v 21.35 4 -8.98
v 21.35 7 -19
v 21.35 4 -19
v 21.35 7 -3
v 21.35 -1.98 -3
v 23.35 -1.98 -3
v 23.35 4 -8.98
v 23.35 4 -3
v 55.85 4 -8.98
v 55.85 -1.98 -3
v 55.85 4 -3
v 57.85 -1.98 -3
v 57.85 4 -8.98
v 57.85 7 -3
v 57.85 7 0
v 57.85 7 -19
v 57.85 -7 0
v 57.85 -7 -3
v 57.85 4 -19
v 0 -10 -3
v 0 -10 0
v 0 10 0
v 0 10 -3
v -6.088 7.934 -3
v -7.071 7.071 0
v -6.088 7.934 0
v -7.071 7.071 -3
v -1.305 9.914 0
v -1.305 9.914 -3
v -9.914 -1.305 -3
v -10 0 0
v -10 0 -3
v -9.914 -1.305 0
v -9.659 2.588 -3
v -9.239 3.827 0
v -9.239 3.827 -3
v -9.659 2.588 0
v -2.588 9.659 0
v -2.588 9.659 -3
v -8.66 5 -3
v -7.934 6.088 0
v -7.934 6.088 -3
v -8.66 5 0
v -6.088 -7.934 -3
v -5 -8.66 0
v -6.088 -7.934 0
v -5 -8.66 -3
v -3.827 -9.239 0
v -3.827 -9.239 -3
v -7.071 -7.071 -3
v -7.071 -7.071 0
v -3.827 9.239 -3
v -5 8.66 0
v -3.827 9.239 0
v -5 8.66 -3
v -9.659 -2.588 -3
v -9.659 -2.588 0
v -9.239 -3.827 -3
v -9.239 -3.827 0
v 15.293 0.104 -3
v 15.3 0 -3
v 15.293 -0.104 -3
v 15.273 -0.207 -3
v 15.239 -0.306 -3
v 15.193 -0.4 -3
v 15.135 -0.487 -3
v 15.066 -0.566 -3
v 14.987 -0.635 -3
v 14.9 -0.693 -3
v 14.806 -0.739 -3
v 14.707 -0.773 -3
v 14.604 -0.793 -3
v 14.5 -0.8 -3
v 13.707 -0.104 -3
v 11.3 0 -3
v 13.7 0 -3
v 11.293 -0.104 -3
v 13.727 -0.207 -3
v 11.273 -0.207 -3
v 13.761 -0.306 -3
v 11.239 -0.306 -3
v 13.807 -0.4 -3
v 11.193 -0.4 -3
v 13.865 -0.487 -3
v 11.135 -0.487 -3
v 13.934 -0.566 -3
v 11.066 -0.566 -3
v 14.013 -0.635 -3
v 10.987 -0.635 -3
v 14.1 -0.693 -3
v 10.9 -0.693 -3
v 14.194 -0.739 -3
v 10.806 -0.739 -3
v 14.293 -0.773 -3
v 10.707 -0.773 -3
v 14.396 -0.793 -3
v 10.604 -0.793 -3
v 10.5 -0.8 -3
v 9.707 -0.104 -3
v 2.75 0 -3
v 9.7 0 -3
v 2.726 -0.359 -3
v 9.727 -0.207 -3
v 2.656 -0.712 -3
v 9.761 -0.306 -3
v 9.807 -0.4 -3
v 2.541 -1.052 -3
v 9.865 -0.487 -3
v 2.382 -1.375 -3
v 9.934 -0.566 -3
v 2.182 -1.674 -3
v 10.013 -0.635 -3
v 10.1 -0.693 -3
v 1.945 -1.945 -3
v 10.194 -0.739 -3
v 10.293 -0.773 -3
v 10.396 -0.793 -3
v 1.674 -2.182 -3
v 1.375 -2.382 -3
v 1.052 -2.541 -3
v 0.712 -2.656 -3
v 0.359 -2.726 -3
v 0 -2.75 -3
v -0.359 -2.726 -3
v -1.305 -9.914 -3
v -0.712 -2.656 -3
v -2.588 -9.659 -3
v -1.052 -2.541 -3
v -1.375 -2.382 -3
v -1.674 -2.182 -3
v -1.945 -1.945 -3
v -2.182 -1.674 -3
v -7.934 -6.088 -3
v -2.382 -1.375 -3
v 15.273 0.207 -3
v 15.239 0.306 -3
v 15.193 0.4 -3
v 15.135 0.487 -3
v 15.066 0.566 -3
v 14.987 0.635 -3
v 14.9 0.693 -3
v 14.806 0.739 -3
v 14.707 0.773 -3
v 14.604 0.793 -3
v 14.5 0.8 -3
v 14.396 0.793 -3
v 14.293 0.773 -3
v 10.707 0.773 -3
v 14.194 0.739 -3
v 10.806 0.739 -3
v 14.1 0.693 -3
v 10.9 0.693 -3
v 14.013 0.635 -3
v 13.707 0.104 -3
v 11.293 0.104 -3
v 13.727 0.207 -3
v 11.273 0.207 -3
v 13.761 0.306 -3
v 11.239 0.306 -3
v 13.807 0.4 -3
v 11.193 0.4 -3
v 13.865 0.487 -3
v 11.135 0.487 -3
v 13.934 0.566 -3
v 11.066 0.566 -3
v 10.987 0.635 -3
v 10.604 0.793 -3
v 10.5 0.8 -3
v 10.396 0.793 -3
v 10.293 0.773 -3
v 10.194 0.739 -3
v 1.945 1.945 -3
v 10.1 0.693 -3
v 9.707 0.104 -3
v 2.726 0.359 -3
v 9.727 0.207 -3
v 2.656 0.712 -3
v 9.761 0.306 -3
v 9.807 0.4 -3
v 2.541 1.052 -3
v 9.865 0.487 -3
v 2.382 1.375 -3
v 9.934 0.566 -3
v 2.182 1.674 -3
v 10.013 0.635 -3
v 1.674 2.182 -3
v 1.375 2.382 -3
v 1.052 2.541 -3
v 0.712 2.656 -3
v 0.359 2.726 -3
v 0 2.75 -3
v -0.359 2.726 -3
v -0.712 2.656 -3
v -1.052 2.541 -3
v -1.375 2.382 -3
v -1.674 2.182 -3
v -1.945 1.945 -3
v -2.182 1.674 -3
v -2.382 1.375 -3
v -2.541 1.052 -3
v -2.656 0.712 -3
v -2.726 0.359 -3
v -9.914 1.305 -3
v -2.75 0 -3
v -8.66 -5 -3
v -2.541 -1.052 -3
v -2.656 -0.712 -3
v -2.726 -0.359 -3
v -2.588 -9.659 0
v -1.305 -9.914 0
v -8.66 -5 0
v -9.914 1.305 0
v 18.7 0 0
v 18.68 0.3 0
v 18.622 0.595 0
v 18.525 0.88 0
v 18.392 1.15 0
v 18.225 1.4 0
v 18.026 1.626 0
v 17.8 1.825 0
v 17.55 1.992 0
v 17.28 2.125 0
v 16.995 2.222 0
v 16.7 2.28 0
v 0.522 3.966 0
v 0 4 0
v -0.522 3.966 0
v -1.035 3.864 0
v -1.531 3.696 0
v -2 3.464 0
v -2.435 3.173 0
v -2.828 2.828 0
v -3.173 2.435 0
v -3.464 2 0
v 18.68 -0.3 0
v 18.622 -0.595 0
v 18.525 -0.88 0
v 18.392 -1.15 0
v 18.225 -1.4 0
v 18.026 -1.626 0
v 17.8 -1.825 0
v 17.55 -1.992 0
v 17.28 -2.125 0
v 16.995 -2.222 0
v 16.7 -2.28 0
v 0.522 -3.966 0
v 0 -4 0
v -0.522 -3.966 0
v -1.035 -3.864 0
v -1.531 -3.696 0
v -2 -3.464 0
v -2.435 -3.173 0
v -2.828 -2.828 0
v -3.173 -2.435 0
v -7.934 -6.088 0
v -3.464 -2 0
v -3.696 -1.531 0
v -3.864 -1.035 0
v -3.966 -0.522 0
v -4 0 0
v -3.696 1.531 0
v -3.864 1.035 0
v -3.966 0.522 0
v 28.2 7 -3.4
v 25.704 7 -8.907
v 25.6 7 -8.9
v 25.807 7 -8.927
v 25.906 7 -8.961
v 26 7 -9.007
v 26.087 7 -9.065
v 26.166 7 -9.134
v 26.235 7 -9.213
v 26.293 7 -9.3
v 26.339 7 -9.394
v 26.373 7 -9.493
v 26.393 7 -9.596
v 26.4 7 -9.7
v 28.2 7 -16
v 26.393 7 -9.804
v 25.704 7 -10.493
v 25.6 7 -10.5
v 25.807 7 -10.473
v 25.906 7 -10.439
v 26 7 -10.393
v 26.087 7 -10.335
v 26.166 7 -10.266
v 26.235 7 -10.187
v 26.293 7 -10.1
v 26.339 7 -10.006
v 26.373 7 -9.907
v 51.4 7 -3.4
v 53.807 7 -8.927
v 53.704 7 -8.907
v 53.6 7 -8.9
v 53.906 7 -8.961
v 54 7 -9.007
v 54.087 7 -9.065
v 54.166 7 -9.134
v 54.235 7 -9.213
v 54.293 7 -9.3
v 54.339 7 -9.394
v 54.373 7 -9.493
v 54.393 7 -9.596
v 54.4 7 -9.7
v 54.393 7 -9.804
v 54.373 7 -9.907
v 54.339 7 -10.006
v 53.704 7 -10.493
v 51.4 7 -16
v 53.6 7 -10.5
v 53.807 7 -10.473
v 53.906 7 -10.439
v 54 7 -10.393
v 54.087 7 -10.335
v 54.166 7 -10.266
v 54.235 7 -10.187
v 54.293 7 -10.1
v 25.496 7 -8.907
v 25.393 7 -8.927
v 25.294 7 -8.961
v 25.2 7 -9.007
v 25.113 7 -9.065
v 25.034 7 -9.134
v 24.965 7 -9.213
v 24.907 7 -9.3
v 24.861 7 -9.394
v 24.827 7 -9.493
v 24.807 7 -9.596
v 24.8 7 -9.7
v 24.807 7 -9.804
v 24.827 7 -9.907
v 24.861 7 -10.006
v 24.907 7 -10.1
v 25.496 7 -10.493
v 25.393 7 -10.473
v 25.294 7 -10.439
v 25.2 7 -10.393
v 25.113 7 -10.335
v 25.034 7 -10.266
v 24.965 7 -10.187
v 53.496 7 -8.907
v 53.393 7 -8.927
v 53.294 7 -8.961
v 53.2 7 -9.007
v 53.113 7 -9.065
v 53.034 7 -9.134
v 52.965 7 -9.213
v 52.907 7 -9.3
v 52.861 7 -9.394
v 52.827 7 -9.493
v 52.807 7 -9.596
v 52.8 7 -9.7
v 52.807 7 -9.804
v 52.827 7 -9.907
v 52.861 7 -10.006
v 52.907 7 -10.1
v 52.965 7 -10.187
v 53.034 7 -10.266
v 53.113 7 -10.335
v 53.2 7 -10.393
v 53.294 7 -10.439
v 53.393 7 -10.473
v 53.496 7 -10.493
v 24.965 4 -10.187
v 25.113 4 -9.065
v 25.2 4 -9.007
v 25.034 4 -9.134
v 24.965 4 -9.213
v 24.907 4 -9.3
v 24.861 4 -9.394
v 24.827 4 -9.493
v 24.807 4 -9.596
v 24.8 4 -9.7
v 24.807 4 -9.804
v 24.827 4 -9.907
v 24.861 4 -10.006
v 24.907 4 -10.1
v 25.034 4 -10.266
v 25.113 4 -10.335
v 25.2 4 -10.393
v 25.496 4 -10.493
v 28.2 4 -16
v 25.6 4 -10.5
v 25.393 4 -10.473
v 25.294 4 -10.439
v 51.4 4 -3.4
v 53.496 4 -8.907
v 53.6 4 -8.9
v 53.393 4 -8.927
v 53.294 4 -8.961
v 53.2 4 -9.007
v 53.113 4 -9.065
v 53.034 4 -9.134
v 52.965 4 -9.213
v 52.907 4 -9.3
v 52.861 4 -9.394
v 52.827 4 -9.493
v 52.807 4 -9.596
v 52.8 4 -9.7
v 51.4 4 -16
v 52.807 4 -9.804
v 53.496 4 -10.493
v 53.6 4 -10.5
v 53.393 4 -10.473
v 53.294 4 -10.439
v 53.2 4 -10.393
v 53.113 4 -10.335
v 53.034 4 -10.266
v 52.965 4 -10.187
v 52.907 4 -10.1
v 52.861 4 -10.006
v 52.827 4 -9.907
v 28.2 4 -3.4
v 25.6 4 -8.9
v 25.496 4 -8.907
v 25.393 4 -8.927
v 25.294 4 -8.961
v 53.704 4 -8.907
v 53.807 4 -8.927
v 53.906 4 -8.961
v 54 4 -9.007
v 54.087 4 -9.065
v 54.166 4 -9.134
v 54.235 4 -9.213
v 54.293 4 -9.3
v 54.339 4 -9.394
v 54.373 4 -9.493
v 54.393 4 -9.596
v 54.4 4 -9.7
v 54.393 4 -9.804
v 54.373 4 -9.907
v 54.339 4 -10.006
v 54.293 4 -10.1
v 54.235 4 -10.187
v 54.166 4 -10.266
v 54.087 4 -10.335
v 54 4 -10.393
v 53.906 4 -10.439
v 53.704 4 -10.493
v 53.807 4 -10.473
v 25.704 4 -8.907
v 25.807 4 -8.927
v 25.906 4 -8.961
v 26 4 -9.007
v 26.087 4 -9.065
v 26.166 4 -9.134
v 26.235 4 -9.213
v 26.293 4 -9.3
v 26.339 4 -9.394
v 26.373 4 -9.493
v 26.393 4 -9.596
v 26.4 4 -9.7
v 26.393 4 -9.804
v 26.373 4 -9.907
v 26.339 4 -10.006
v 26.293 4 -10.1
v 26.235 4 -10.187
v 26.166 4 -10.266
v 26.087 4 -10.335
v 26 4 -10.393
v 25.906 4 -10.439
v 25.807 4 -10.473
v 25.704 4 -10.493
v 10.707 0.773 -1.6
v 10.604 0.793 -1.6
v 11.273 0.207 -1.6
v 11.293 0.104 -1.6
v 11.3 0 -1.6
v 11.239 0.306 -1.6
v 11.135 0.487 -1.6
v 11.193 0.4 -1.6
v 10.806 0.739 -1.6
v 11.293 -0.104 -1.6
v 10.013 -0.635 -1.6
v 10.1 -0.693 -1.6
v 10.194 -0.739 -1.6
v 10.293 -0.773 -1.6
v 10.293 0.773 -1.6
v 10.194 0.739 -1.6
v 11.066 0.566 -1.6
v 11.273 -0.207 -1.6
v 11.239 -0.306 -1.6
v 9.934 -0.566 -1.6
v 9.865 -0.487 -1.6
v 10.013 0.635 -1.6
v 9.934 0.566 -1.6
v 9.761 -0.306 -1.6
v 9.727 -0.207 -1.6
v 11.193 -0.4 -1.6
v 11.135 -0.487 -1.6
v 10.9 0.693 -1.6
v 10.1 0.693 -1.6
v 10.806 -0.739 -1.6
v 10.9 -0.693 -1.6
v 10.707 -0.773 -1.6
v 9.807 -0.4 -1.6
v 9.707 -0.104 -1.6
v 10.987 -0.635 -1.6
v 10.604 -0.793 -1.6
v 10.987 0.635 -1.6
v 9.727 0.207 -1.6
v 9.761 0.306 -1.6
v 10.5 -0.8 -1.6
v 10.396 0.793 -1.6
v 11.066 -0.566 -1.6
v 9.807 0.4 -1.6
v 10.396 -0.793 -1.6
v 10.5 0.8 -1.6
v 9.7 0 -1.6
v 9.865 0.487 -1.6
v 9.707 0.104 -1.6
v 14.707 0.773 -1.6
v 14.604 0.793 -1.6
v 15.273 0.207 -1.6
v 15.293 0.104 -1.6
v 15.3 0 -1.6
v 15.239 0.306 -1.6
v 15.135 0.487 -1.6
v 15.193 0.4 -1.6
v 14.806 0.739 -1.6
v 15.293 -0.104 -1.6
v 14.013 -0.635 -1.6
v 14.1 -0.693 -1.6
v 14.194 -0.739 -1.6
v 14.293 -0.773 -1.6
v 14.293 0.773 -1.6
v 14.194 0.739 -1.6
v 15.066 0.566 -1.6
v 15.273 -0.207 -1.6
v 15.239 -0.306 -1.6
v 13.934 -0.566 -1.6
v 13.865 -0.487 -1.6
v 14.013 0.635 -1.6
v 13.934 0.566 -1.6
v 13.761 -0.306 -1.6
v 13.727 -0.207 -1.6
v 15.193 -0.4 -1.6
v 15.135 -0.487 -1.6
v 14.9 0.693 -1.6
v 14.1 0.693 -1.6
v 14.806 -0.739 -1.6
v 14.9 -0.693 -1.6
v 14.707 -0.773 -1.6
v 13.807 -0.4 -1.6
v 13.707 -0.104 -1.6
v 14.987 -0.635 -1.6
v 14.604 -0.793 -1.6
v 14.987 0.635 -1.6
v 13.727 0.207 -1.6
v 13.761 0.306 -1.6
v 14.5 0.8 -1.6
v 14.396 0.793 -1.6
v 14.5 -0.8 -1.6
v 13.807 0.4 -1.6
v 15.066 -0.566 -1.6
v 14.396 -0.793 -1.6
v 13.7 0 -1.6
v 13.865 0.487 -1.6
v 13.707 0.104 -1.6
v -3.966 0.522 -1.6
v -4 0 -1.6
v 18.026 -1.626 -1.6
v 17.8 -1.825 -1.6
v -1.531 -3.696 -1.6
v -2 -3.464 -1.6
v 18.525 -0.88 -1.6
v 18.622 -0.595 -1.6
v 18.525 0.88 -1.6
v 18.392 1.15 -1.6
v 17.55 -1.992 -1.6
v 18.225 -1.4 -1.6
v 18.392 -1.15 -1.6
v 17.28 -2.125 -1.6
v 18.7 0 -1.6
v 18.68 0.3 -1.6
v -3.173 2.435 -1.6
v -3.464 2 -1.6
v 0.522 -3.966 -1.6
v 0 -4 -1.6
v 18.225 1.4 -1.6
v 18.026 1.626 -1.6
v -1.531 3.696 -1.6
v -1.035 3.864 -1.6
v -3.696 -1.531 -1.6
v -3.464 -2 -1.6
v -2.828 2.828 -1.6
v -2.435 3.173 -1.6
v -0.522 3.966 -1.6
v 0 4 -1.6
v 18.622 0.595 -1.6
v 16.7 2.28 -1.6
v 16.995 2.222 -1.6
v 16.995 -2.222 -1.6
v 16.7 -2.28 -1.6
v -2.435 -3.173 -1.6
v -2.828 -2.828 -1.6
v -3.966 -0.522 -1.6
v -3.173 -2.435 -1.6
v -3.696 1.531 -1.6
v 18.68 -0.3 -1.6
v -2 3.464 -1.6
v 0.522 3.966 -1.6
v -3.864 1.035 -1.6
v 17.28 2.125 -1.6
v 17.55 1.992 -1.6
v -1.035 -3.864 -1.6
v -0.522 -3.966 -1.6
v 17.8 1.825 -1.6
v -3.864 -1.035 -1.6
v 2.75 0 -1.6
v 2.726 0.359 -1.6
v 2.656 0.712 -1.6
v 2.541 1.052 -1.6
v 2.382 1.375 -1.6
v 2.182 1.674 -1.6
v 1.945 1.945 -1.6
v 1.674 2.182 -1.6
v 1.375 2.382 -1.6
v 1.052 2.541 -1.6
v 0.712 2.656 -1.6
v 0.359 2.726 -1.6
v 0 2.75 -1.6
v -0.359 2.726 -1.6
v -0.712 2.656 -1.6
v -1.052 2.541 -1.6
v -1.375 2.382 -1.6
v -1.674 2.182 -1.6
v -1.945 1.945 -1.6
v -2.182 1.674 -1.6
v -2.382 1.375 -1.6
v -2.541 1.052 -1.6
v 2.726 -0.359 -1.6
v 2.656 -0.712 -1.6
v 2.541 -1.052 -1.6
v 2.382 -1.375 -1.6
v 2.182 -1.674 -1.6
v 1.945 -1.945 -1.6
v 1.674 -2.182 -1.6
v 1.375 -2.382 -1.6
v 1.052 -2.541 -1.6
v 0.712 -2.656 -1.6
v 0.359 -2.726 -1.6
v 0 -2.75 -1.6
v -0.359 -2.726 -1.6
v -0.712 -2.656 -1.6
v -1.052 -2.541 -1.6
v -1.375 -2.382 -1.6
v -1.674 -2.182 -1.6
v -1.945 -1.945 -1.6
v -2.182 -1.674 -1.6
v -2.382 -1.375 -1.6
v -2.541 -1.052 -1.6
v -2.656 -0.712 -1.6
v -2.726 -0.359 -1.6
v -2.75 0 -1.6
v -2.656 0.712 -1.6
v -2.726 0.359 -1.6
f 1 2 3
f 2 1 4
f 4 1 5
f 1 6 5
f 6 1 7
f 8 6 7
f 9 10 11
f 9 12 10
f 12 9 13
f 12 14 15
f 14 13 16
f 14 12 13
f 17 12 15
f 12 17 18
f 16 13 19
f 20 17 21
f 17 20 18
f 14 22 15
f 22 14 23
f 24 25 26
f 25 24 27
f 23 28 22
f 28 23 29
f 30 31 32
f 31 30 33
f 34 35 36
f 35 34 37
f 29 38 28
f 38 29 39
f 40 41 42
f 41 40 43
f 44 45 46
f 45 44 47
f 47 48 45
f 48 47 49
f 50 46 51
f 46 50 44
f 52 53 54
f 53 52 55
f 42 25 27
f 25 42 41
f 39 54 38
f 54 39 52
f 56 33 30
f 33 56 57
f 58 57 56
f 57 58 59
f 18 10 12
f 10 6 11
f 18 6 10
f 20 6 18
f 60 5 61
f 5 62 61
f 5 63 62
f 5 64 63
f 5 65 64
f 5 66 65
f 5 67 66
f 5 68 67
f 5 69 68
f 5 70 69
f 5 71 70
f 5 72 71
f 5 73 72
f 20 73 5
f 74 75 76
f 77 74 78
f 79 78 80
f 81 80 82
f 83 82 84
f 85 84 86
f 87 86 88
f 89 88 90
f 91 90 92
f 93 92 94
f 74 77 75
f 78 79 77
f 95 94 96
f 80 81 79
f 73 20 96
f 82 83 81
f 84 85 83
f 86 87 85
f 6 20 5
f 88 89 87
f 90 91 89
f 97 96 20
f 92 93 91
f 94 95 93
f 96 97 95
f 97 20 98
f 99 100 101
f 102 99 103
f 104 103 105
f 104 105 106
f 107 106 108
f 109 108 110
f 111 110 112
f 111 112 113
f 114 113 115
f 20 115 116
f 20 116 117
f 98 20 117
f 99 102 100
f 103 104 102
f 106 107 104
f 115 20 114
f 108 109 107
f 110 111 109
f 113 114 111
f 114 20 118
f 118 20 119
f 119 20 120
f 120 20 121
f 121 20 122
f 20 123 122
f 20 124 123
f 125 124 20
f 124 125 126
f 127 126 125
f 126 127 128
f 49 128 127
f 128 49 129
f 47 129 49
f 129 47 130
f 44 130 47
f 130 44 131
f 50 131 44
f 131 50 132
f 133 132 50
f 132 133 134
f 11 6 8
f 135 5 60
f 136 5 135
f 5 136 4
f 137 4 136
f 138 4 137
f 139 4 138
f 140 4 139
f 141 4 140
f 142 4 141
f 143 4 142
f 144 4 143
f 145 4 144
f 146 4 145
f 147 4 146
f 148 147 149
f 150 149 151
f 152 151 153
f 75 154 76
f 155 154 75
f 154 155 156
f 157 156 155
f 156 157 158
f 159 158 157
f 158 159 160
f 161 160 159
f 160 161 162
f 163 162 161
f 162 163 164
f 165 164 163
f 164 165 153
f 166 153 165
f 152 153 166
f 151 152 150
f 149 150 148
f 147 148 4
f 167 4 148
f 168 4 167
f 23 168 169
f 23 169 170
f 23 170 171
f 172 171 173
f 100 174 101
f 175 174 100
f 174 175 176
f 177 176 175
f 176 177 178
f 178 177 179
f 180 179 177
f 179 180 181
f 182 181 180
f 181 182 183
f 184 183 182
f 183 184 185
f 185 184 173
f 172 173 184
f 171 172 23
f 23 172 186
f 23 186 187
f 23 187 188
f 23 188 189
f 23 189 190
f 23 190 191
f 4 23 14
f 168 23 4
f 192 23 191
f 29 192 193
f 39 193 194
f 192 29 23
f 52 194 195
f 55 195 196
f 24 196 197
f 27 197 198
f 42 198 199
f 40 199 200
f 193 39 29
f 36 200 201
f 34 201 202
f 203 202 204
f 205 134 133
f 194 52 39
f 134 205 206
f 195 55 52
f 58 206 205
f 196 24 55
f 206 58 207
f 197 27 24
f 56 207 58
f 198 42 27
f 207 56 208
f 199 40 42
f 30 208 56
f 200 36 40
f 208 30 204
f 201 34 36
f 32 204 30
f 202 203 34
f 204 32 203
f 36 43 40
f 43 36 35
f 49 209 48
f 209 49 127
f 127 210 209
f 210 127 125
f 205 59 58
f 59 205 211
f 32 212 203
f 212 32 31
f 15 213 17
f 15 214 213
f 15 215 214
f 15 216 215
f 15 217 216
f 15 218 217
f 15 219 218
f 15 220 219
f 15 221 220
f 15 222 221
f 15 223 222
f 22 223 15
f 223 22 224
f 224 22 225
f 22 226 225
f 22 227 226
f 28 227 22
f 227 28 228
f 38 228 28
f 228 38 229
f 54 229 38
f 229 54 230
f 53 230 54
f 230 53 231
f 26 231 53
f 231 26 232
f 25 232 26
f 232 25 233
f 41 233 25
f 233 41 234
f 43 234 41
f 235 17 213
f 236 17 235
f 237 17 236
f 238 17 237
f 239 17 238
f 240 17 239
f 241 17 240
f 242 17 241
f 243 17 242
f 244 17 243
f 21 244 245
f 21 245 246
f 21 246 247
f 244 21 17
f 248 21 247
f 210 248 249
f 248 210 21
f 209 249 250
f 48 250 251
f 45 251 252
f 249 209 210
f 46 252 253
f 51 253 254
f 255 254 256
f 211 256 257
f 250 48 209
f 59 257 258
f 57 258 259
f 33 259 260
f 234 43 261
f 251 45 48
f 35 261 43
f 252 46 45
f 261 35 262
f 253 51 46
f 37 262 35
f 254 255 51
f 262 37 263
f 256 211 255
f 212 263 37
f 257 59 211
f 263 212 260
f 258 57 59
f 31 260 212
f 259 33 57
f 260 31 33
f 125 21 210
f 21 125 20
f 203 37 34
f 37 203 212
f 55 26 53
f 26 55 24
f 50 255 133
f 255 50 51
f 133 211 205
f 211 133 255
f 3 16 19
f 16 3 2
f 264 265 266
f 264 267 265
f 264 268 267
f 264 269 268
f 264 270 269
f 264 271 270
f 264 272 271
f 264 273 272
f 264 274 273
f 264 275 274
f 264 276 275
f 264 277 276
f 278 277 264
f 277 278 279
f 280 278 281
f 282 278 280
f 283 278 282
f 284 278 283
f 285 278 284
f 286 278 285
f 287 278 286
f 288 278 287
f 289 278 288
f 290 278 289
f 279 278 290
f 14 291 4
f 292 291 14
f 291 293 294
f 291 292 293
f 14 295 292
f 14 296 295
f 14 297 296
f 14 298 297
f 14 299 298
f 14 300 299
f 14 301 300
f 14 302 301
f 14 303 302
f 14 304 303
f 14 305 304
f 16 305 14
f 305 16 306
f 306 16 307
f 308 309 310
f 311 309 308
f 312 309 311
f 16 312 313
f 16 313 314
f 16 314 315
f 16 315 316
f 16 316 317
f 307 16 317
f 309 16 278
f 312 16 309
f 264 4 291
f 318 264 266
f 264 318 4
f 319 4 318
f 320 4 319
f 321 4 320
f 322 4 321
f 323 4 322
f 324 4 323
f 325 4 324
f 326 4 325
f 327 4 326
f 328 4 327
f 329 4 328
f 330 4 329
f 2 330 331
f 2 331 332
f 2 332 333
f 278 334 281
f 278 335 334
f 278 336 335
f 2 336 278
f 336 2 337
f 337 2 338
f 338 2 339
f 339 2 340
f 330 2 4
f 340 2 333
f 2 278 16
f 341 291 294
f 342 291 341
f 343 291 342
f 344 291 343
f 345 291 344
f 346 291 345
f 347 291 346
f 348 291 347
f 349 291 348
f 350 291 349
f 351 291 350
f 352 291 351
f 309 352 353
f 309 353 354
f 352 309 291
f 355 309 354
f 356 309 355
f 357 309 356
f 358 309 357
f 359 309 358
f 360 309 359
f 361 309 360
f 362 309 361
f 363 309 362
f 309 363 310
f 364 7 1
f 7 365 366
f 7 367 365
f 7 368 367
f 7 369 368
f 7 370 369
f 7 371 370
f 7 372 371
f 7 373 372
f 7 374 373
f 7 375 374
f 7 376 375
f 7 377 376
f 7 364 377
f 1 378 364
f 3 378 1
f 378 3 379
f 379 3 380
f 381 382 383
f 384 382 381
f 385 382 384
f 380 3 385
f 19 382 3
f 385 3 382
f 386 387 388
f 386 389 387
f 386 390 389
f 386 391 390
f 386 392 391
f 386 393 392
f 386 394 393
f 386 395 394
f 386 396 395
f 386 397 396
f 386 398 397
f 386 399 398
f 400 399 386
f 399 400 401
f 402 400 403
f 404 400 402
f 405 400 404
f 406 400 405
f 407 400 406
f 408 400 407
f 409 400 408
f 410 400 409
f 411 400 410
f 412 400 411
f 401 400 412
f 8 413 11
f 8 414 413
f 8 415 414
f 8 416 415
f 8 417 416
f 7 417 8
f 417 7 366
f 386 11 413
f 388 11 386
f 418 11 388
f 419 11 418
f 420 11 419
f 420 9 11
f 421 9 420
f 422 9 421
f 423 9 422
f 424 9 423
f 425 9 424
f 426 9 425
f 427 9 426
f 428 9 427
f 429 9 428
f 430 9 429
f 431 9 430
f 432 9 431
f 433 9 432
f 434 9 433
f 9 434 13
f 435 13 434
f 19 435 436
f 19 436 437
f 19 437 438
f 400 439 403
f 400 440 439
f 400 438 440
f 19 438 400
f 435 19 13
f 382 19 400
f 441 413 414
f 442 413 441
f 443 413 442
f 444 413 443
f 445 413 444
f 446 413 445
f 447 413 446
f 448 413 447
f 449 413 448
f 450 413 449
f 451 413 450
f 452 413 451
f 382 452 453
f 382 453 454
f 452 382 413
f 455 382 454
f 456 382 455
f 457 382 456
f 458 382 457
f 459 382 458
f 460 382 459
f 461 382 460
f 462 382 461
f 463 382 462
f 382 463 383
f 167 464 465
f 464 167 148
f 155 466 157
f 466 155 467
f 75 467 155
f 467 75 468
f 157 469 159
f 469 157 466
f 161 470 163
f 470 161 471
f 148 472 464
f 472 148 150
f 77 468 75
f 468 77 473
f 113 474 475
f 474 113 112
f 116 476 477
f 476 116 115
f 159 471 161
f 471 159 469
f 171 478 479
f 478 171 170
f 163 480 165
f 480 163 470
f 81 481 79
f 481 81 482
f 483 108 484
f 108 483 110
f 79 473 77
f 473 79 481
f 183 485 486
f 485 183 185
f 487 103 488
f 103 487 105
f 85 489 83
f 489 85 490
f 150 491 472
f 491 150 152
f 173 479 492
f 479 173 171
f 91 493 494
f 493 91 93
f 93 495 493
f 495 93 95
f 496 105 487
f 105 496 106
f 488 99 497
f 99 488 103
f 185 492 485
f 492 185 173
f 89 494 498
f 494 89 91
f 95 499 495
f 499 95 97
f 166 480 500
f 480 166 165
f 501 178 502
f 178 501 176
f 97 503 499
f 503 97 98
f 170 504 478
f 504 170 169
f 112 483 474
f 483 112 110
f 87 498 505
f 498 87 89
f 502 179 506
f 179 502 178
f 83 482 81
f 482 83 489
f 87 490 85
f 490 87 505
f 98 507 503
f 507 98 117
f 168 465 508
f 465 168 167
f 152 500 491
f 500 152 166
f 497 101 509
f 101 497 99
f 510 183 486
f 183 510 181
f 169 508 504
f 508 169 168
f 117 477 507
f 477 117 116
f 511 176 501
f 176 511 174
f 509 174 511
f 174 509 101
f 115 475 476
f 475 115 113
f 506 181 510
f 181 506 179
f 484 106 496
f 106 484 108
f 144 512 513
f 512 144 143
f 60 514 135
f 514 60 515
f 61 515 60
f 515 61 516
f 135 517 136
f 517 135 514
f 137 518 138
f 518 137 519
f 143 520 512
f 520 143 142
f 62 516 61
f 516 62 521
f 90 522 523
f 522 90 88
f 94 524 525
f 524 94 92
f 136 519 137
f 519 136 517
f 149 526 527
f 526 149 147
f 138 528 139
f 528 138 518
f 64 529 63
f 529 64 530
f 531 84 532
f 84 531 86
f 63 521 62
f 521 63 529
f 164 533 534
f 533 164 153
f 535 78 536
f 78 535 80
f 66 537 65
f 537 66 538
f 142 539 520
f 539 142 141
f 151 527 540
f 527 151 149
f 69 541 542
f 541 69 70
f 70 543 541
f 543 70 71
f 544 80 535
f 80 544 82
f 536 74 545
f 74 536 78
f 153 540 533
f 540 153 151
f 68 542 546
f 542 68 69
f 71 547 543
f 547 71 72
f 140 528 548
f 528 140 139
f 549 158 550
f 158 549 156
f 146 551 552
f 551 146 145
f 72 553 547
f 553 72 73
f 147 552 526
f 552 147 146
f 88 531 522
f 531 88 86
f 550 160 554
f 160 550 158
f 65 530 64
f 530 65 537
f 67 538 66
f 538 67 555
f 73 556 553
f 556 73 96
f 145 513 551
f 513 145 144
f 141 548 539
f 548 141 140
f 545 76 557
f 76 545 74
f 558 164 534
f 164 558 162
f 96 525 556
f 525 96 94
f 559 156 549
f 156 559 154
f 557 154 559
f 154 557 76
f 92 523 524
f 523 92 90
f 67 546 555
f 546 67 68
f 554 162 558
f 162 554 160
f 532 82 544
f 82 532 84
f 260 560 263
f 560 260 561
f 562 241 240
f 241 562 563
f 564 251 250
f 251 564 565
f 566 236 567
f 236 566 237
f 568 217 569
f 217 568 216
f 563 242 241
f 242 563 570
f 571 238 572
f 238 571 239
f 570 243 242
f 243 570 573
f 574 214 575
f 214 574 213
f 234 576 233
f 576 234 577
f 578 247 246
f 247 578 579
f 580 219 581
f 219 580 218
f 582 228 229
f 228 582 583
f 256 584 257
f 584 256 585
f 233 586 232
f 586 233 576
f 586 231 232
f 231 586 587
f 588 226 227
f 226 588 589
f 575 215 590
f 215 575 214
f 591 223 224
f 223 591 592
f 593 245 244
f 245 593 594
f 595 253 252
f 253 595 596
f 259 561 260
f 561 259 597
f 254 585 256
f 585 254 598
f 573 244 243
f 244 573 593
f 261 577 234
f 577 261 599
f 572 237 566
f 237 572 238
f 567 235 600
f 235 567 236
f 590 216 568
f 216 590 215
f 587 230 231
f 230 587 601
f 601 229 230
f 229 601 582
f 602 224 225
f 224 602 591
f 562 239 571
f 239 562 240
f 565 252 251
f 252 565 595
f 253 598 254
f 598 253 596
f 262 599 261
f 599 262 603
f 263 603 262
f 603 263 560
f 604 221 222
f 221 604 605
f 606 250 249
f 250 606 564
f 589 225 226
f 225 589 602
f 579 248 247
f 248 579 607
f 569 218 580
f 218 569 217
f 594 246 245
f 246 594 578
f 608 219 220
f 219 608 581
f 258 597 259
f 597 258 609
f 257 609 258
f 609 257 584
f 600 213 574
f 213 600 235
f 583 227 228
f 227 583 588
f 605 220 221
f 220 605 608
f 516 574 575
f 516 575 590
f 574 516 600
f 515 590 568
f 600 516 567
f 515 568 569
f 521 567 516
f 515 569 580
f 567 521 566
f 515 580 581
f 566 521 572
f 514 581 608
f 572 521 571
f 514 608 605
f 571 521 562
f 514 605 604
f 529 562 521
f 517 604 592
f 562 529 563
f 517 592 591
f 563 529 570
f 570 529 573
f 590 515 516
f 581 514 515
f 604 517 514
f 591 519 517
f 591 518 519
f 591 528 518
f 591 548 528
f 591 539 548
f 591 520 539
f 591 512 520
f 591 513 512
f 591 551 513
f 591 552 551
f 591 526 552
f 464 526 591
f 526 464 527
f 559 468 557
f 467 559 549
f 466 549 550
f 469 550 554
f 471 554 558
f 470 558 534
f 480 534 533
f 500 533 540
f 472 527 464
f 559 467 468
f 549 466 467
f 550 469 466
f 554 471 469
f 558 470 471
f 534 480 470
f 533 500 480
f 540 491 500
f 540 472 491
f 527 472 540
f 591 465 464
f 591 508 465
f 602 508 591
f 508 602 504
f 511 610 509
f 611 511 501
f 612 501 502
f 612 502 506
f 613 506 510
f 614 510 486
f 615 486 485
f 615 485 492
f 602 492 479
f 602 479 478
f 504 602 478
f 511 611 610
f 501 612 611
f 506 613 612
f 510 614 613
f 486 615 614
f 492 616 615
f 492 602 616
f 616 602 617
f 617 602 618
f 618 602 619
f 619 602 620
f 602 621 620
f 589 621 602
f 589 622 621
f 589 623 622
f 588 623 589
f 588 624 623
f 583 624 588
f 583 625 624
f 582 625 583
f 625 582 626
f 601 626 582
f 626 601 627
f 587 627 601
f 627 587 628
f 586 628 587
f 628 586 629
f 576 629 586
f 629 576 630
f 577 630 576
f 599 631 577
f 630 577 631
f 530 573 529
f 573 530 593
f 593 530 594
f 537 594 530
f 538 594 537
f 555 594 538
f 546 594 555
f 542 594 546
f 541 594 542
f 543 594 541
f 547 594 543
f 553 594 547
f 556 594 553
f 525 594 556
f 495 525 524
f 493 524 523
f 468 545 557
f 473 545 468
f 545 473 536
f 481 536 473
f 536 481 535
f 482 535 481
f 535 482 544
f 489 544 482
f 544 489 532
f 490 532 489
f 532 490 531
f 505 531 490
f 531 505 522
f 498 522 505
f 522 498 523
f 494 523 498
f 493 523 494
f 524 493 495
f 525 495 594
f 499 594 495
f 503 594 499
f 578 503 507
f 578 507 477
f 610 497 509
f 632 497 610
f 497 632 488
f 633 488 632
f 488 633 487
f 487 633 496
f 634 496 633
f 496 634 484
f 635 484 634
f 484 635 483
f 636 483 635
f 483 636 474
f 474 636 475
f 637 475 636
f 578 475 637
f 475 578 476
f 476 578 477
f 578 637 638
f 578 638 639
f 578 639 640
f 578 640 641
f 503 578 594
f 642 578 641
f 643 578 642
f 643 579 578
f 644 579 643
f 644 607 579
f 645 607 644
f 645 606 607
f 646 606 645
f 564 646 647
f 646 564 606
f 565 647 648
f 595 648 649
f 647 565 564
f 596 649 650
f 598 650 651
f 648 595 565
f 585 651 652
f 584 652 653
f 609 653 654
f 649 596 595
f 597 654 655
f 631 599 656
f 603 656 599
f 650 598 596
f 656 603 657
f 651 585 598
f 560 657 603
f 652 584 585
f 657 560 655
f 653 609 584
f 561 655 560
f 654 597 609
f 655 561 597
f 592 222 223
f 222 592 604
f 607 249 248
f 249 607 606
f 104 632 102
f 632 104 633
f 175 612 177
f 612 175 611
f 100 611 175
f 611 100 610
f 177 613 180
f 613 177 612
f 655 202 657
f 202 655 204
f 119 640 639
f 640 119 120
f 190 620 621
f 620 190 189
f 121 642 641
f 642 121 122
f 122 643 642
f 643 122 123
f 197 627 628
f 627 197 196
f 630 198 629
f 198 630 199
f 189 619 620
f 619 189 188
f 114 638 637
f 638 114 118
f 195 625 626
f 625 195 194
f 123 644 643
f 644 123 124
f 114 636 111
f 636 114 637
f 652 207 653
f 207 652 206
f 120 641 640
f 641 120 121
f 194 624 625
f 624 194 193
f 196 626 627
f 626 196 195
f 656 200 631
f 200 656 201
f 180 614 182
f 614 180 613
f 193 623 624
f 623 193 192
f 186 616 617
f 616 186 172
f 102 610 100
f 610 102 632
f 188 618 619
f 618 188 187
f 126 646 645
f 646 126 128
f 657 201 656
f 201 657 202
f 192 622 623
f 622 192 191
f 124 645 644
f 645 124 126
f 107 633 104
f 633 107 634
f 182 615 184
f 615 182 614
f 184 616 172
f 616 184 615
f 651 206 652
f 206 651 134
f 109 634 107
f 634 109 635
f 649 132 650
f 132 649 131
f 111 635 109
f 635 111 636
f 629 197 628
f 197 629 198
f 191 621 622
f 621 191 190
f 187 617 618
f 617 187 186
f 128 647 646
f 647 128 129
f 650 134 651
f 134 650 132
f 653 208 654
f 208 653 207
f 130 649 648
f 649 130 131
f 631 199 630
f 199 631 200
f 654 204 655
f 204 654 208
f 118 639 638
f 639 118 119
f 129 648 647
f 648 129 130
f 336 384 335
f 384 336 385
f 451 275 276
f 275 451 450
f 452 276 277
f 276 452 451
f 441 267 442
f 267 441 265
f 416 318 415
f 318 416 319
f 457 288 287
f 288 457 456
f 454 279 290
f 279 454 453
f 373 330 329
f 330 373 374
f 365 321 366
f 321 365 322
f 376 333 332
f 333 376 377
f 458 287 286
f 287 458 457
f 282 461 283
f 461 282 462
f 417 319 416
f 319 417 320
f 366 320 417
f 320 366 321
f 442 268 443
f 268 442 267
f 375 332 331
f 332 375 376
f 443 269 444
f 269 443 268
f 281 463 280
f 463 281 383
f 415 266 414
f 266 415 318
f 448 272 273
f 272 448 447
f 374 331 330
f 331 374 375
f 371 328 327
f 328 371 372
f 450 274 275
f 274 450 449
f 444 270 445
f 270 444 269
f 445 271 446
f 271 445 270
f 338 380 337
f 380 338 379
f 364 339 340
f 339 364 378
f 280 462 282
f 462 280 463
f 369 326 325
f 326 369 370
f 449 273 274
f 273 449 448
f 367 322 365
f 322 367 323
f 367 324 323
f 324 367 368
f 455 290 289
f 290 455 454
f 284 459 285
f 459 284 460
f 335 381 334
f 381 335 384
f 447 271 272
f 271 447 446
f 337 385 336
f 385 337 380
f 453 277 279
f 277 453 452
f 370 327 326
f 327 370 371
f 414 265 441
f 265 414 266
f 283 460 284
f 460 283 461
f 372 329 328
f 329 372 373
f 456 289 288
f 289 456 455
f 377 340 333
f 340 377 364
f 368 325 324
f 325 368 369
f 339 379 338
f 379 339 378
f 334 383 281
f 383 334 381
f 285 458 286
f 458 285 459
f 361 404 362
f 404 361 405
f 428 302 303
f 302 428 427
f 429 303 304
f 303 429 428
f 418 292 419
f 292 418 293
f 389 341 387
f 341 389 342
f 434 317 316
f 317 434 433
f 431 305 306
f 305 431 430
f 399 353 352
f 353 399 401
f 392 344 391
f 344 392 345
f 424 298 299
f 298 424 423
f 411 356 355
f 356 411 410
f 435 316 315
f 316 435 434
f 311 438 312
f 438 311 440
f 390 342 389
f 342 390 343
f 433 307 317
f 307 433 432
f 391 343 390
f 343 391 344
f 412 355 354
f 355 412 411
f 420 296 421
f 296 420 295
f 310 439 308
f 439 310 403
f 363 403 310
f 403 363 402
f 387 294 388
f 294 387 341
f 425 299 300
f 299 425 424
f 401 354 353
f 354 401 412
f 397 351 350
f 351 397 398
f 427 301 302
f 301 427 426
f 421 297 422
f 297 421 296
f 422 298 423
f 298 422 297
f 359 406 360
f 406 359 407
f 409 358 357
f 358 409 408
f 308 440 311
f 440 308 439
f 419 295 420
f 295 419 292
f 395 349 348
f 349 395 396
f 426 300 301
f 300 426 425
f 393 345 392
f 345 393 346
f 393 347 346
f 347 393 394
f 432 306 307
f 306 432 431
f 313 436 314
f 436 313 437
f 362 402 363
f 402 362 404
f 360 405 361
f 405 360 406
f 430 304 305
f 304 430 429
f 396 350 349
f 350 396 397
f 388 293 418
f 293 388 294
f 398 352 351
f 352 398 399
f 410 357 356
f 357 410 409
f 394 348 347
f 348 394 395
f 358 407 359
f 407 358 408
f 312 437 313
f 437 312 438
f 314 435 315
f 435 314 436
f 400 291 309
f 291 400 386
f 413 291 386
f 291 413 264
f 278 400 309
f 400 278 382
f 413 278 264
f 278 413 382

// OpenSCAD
// file: params.scad
// 六足机器人 · 共享参数（被 body_plate / deck / femur / tibia 引用，本文件自己不导出 STL）
//
// 腿的几何尺寸和 Seeker 固件 mcu_ws/lib/RobotConfig/HexapodConfig.h 一一对应：
//   body_half_length ↔ kBodyHalfLength    body_half_width ↔ kBodyHalfWidth
//   L1 ↔ kL1（髋轴 → 膝轴）              L2 ↔ kL2（膝轴 → 脚尖）
// 改了这里的数字，固件里的同名常数也要一起改。
//
// ★ 先用游标卡尺量你的舵机和舵机臂，改 [舵机] 和 [舵机臂] 两组数字，再导出 STL。

/* [舵机 MG90S（量你自己的）] */
servo_w = 12.2;           // 机身宽度 (mm)
servo_l = 22.8;           // 机身长度，沿安装耳方向 (mm)
ear_span = 32.5;          // 两个安装耳外端之间的总长 (mm)
ear_hole_spacing = 28.0;  // 两个安装孔的中心距 (mm)
ear_z = 15.9;             // 机身底面 → 安装耳下表面 (mm)
case_h = 22.7;            // 机身底面 → 机壳顶面（不含输出轴）(mm)
shaft_off = 5.4;          // 输出轴中心 → 机身中心，沿长度方向 (mm)
shaft_gap = 4.0;          // 机壳顶面 → 舵机臂贴合面（花键凸台高度）(mm)

/* [舵机臂（单边臂，量你自己的）] */
horn_hub_d = 7.6;         // 舵机臂中心圆盘直径 (mm)
horn_len = 18.5;          // 中心 → 臂尖 (mm)
horn_w_hub = 6.2;         // 臂根宽度 (mm)
horn_w_tip = 4.2;         // 臂尖宽度 (mm)
horn_t = 1.6;             // 臂厚 = 零件上凹槽深度 (mm)
horn_holes = [10.5, 14.5];// 用来固定舵机臂的两个孔到中心的距离 (mm)
horn_screw_access = 5.5;  // 中心过孔：舵机臂中心螺丝和螺丝刀从这里进 (mm)

/* [腿的几何（和固件一致）] */
body_half_length = 60;    // 前 / 后腿髋轴到机身中心的 X 距离 (mm)
body_half_width = 40;     // 左 / 右腿髋轴到机身中心的 Y 距离 (mm)
L1 = 45;                  // 大腿：髋轴 → 膝轴 (mm)
L2 = 65;                  // 小腿：膝轴 → 脚尖 (mm)

/* [打印余量] */
clearance = 0.4;          // 方孔比舵机大多少 (mm)；太紧就加大到 0.5
screw_pilot = 1.6;        // M2 自攻螺丝底孔 (mm)
m3_hole = 3.4;            // M3 通孔 (mm)

/* [Hidden] */
// 6 条腿：[髋轴 X, 髋轴 Y, 朝外方向角°]，顺序 FL FR ML MR RL RR（和固件的 leg 0..5 一致）
legs = [
  [ body_half_length,  body_half_width,   60],
  [ body_half_length, -body_half_width,  -60],
  [ 0,                 body_half_width,   90],
  [ 0,                -body_half_width,  -90],
  [-body_half_length,  body_half_width,  120],
  [-body_half_length, -body_half_width, -120]
];
leg_names = ["FL", "FR", "ML", "MR", "RL", "RR"];

pocket_w = servo_w + clearance;
pocket_l = servo_l + clearance;
servo_end_out = servo_l / 2 - shaft_off;   // 输出轴 → 机身外端 (mm)
servo_end_in = servo_l / 2 + shaft_off;    // 输出轴 → 机身内端 (mm)

// 单边舵机臂的 2D 外形：中心在原点，臂沿 +X
module horn_2d(extra = 0) {
  hull() {
    circle(d = horn_hub_d + extra);
    translate([0, -(horn_w_hub + extra) / 2]) square([0.01, horn_w_hub + extra]);
    translate([horn_len - horn_w_tip / 2, 0]) circle(d = horn_w_tip + extra);
  }
}

// 舵机臂凹槽（从 z = 0 往 +Z 挖 horn_t 深）+ 中心过孔 + 两个固定孔
module horn_cut(depth_through = 10) {
  translate([0, 0, -0.01]) linear_extrude(horn_t + 0.01) horn_2d(clearance);
  translate([0, 0, -1]) cylinder(d = horn_screw_access, h = depth_through + 2);
  for (r = horn_holes) translate([r, 0, -1]) cylinder(d = screw_pilot, h = depth_through + 2);
}
// main file
// 六足机器人 · 大腿 (femur)
//
// 一头（原点）压在髋舵机的舵机臂上，另一头是一块竖着的侧板，膝舵机横着插在侧板的方孔里，
// 输出轴朝外，小腿 (tibia.scad) 装在膝舵机的舵机臂上。髋轴 → 膝轴的距离 = L1。
//
//   side = "a"：左边三条腿（FL / ML / RL）用，3 个
//   side = "b"：右边三条腿（FR / MR / RR）用，3 个（a 的镜像）
//
// 打印：PETG 或 PLA+，层高 0.2 mm，4 圈壁，30% 填充。
//       顶面（有舵机臂凹槽的一面）朝下贴热床，侧板朝上，不需要支撑。
// 坐标：原点 = 髋轴，X+ = 沿大腿朝外，Z+ = 朝上（装到机器人上时的方向）。

include <params.scad>

side = "a";               // "a" 或 "b"

/* [大腿] */
arm_t = 3.0;              // 上面横板厚度 (mm)
arm_w = 14;               // 横板宽度 (mm)
hub_r = 10;               // 髋端圆盘半径 (mm)
wall_t = 3.0;             // 侧板厚度 (mm)
wall_margin = 3.0;        // 侧板在舵机方孔下面留的边 (mm)
servo_gap = 0.4;          // 膝舵机和横板之间留的缝 (mm)

/* [Hidden] */
$fn = 48;
w0 = arm_w / 2;                                       // 侧板外表面的 Y
z_k = -arm_t - servo_gap - pocket_w / 2;              // 膝轴的 Z
wall_x0 = L1 - shaft_off - ear_span / 2 - 2;          // 侧板起点
wall_x1 = L1 - shaft_off + ear_span / 2 + 2;          // 侧板终点
wall_z0 = z_k - pocket_w / 2 - wall_margin;           // 侧板底边

module arm() {
  hull() {
    translate([0, 0, -arm_t]) cylinder(r = hub_r, h = arm_t);
    translate([wall_x1 - 1, -arm_w / 2, -arm_t]) cube([1, arm_w, arm_t]);
  }
}

module wall() {
  translate([wall_x0, w0 - wall_t, wall_z0]) cube([wall_x1 - wall_x0, wall_t, -wall_z0]);
}

// 侧板和横板之间的三角加强筋（在侧板内侧、方孔两头以外）
module ribs() {
  for (x = [wall_x0, wall_x1 - 2])
    translate([x, w0 - wall_t + 0.01, -arm_t + 0.01])
      rotate([90, 0, 90]) linear_extrude(2)
        polygon([[0, 0], [-6, 0], [0, -6]]);
}

module femur_a() {
  difference() {
    union() { arm(); wall(); ribs(); }
    // 髋舵机的舵机臂凹槽：在顶面 (z = 0) 往下挖
    translate([0, 0, 0]) mirror([0, 0, 1]) horn_cut(arm_t);
    // 膝舵机方孔（沿 Y 贯穿侧板），输出轴在 x = L1
    translate([L1 - servo_end_in, w0 - wall_t - 1, z_k - pocket_w / 2])
      cube([pocket_l, wall_t + 2, pocket_w]);
    // 膝舵机安装耳螺丝孔
    for (s = [-1, 1])
      translate([L1 - shaft_off + s * ear_hole_spacing / 2, w0 + 1, z_k])
        rotate([90, 0, 0]) cylinder(d = screw_pilot, h = wall_t + 2);
  }
}

if (side == "b") mirror([0, 1, 0]) femur_a(); else femur_a();

echo(str("膝轴位置 x = ", L1, " mm, z = ", z_k, " mm；膝舵机输出轴端面约在 y = ",
         w0 + case_h - ear_z, " mm"));
